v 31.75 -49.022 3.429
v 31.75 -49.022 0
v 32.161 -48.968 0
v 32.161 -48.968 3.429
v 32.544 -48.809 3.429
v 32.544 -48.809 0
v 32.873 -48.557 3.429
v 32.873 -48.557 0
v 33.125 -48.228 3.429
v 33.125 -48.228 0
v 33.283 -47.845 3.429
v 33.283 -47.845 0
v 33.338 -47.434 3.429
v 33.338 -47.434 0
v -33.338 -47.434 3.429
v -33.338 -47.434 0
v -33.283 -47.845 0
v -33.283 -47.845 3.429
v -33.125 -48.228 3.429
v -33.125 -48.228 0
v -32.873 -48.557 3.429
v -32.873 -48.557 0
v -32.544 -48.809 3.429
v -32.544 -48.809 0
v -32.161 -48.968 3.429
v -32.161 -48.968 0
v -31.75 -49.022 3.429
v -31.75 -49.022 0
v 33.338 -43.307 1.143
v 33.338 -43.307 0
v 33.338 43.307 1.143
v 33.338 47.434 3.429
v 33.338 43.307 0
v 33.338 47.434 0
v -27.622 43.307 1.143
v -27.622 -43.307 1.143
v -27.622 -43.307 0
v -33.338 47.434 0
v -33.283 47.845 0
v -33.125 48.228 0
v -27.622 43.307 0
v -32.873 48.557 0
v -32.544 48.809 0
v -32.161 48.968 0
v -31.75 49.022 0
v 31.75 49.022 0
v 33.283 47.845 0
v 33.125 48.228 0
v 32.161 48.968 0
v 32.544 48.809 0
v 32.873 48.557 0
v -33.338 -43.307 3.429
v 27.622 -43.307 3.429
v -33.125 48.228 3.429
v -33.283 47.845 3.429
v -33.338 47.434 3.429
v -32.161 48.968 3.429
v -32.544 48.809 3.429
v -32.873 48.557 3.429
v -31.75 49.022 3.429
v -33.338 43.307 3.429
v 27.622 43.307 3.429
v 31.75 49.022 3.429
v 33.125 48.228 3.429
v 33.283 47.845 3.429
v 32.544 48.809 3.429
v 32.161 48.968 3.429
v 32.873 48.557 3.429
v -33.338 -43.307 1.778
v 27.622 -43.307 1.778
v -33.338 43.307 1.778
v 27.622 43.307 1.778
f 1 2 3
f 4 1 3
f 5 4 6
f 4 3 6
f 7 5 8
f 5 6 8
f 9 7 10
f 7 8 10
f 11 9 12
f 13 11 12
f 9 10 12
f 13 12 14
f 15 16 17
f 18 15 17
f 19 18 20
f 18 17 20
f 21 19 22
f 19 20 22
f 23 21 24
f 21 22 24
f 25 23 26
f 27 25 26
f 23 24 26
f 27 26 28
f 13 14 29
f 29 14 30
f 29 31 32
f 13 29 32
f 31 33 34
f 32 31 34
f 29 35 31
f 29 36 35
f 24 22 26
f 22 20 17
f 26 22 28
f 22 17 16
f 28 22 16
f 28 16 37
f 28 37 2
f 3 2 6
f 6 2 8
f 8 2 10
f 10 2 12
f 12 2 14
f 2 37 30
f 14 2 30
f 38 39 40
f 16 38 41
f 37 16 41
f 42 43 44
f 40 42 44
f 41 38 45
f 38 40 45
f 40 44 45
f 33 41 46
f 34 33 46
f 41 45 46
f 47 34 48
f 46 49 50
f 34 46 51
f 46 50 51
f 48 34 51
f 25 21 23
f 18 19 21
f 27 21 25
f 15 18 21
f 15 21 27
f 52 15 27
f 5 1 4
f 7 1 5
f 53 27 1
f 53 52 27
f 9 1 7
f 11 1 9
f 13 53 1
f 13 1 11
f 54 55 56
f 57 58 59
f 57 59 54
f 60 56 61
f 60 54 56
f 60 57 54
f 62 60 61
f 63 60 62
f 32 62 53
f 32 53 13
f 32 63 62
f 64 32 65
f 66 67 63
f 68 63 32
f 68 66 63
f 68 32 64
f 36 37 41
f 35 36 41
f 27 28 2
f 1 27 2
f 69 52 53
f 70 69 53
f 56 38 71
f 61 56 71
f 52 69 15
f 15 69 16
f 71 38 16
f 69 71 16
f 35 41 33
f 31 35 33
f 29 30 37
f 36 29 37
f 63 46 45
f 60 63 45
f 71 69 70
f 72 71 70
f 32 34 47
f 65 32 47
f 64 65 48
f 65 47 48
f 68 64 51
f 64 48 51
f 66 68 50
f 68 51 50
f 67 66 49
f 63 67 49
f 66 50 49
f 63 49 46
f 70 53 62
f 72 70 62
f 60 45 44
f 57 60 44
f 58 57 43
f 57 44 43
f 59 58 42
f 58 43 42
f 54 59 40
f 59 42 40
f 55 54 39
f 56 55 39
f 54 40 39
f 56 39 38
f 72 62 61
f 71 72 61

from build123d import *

# Parameters (mm, degrees)
F1_DEPTH = 3.429
F3_DEPTH = 1.651
F5_DEPTH = 1.143


with BuildPart() as f1:
    # F0 (on Top) → F1 (new body)
    with BuildSketch(Plane.XY):
        with BuildLine():
            Line((-31.75, -49.022), (31.75, -49.022))
            ThreePointArc((31.75, -49.022), (32.872532, -48.557032), (33.3375, -47.4345))
            Line((33.3375, -47.4345), (33.3375, 47.4345))
            ThreePointArc((33.3375, 47.4345), (32.872532, 48.557032), (31.75, 49.022))
            Line((31.75, 49.022), (-31.75, 49.022))
            ThreePointArc((-31.75, 49.022), (-32.872532, 48.557032), (-33.3375, 47.4345))
            Line((-33.3375, 47.4345), (-33.3375, -47.4345))
            ThreePointArc((-33.3375, -47.4345), (-32.872532, -48.557032), (-31.75, -49.022))
        make_face()
    extrude(amount=F1_DEPTH)

    # F2 (on face) → F3 (cut)
    with BuildSketch(Plane.XY.offset(3.429)):
        Polygon((-27.6225, -43.307), (27.6225, -43.307), (27.6225, 43.307), (-27.6225, 43.307), (-33.3375, 43.307), (-33.3375, -43.307), align=None)
    extrude(amount=-F3_DEPTH, mode=Mode.SUBTRACT)

    # F4 (on face) → F5 (cut)
    with BuildSketch(Plane(origin=(0, 0, 0), x_dir=(1, 0, 0), z_dir=(0, 0, -1))):
        Polygon((-27.6225, -43.307), (27.6225, -43.307), (33.3375, -43.307), (33.3375, 43.307), (27.6225, 43.307), (-27.6225, 43.307), align=None)
    extrude(amount=-F5_DEPTH, mode=Mode.SUBTRACT)


solid = f1.part
